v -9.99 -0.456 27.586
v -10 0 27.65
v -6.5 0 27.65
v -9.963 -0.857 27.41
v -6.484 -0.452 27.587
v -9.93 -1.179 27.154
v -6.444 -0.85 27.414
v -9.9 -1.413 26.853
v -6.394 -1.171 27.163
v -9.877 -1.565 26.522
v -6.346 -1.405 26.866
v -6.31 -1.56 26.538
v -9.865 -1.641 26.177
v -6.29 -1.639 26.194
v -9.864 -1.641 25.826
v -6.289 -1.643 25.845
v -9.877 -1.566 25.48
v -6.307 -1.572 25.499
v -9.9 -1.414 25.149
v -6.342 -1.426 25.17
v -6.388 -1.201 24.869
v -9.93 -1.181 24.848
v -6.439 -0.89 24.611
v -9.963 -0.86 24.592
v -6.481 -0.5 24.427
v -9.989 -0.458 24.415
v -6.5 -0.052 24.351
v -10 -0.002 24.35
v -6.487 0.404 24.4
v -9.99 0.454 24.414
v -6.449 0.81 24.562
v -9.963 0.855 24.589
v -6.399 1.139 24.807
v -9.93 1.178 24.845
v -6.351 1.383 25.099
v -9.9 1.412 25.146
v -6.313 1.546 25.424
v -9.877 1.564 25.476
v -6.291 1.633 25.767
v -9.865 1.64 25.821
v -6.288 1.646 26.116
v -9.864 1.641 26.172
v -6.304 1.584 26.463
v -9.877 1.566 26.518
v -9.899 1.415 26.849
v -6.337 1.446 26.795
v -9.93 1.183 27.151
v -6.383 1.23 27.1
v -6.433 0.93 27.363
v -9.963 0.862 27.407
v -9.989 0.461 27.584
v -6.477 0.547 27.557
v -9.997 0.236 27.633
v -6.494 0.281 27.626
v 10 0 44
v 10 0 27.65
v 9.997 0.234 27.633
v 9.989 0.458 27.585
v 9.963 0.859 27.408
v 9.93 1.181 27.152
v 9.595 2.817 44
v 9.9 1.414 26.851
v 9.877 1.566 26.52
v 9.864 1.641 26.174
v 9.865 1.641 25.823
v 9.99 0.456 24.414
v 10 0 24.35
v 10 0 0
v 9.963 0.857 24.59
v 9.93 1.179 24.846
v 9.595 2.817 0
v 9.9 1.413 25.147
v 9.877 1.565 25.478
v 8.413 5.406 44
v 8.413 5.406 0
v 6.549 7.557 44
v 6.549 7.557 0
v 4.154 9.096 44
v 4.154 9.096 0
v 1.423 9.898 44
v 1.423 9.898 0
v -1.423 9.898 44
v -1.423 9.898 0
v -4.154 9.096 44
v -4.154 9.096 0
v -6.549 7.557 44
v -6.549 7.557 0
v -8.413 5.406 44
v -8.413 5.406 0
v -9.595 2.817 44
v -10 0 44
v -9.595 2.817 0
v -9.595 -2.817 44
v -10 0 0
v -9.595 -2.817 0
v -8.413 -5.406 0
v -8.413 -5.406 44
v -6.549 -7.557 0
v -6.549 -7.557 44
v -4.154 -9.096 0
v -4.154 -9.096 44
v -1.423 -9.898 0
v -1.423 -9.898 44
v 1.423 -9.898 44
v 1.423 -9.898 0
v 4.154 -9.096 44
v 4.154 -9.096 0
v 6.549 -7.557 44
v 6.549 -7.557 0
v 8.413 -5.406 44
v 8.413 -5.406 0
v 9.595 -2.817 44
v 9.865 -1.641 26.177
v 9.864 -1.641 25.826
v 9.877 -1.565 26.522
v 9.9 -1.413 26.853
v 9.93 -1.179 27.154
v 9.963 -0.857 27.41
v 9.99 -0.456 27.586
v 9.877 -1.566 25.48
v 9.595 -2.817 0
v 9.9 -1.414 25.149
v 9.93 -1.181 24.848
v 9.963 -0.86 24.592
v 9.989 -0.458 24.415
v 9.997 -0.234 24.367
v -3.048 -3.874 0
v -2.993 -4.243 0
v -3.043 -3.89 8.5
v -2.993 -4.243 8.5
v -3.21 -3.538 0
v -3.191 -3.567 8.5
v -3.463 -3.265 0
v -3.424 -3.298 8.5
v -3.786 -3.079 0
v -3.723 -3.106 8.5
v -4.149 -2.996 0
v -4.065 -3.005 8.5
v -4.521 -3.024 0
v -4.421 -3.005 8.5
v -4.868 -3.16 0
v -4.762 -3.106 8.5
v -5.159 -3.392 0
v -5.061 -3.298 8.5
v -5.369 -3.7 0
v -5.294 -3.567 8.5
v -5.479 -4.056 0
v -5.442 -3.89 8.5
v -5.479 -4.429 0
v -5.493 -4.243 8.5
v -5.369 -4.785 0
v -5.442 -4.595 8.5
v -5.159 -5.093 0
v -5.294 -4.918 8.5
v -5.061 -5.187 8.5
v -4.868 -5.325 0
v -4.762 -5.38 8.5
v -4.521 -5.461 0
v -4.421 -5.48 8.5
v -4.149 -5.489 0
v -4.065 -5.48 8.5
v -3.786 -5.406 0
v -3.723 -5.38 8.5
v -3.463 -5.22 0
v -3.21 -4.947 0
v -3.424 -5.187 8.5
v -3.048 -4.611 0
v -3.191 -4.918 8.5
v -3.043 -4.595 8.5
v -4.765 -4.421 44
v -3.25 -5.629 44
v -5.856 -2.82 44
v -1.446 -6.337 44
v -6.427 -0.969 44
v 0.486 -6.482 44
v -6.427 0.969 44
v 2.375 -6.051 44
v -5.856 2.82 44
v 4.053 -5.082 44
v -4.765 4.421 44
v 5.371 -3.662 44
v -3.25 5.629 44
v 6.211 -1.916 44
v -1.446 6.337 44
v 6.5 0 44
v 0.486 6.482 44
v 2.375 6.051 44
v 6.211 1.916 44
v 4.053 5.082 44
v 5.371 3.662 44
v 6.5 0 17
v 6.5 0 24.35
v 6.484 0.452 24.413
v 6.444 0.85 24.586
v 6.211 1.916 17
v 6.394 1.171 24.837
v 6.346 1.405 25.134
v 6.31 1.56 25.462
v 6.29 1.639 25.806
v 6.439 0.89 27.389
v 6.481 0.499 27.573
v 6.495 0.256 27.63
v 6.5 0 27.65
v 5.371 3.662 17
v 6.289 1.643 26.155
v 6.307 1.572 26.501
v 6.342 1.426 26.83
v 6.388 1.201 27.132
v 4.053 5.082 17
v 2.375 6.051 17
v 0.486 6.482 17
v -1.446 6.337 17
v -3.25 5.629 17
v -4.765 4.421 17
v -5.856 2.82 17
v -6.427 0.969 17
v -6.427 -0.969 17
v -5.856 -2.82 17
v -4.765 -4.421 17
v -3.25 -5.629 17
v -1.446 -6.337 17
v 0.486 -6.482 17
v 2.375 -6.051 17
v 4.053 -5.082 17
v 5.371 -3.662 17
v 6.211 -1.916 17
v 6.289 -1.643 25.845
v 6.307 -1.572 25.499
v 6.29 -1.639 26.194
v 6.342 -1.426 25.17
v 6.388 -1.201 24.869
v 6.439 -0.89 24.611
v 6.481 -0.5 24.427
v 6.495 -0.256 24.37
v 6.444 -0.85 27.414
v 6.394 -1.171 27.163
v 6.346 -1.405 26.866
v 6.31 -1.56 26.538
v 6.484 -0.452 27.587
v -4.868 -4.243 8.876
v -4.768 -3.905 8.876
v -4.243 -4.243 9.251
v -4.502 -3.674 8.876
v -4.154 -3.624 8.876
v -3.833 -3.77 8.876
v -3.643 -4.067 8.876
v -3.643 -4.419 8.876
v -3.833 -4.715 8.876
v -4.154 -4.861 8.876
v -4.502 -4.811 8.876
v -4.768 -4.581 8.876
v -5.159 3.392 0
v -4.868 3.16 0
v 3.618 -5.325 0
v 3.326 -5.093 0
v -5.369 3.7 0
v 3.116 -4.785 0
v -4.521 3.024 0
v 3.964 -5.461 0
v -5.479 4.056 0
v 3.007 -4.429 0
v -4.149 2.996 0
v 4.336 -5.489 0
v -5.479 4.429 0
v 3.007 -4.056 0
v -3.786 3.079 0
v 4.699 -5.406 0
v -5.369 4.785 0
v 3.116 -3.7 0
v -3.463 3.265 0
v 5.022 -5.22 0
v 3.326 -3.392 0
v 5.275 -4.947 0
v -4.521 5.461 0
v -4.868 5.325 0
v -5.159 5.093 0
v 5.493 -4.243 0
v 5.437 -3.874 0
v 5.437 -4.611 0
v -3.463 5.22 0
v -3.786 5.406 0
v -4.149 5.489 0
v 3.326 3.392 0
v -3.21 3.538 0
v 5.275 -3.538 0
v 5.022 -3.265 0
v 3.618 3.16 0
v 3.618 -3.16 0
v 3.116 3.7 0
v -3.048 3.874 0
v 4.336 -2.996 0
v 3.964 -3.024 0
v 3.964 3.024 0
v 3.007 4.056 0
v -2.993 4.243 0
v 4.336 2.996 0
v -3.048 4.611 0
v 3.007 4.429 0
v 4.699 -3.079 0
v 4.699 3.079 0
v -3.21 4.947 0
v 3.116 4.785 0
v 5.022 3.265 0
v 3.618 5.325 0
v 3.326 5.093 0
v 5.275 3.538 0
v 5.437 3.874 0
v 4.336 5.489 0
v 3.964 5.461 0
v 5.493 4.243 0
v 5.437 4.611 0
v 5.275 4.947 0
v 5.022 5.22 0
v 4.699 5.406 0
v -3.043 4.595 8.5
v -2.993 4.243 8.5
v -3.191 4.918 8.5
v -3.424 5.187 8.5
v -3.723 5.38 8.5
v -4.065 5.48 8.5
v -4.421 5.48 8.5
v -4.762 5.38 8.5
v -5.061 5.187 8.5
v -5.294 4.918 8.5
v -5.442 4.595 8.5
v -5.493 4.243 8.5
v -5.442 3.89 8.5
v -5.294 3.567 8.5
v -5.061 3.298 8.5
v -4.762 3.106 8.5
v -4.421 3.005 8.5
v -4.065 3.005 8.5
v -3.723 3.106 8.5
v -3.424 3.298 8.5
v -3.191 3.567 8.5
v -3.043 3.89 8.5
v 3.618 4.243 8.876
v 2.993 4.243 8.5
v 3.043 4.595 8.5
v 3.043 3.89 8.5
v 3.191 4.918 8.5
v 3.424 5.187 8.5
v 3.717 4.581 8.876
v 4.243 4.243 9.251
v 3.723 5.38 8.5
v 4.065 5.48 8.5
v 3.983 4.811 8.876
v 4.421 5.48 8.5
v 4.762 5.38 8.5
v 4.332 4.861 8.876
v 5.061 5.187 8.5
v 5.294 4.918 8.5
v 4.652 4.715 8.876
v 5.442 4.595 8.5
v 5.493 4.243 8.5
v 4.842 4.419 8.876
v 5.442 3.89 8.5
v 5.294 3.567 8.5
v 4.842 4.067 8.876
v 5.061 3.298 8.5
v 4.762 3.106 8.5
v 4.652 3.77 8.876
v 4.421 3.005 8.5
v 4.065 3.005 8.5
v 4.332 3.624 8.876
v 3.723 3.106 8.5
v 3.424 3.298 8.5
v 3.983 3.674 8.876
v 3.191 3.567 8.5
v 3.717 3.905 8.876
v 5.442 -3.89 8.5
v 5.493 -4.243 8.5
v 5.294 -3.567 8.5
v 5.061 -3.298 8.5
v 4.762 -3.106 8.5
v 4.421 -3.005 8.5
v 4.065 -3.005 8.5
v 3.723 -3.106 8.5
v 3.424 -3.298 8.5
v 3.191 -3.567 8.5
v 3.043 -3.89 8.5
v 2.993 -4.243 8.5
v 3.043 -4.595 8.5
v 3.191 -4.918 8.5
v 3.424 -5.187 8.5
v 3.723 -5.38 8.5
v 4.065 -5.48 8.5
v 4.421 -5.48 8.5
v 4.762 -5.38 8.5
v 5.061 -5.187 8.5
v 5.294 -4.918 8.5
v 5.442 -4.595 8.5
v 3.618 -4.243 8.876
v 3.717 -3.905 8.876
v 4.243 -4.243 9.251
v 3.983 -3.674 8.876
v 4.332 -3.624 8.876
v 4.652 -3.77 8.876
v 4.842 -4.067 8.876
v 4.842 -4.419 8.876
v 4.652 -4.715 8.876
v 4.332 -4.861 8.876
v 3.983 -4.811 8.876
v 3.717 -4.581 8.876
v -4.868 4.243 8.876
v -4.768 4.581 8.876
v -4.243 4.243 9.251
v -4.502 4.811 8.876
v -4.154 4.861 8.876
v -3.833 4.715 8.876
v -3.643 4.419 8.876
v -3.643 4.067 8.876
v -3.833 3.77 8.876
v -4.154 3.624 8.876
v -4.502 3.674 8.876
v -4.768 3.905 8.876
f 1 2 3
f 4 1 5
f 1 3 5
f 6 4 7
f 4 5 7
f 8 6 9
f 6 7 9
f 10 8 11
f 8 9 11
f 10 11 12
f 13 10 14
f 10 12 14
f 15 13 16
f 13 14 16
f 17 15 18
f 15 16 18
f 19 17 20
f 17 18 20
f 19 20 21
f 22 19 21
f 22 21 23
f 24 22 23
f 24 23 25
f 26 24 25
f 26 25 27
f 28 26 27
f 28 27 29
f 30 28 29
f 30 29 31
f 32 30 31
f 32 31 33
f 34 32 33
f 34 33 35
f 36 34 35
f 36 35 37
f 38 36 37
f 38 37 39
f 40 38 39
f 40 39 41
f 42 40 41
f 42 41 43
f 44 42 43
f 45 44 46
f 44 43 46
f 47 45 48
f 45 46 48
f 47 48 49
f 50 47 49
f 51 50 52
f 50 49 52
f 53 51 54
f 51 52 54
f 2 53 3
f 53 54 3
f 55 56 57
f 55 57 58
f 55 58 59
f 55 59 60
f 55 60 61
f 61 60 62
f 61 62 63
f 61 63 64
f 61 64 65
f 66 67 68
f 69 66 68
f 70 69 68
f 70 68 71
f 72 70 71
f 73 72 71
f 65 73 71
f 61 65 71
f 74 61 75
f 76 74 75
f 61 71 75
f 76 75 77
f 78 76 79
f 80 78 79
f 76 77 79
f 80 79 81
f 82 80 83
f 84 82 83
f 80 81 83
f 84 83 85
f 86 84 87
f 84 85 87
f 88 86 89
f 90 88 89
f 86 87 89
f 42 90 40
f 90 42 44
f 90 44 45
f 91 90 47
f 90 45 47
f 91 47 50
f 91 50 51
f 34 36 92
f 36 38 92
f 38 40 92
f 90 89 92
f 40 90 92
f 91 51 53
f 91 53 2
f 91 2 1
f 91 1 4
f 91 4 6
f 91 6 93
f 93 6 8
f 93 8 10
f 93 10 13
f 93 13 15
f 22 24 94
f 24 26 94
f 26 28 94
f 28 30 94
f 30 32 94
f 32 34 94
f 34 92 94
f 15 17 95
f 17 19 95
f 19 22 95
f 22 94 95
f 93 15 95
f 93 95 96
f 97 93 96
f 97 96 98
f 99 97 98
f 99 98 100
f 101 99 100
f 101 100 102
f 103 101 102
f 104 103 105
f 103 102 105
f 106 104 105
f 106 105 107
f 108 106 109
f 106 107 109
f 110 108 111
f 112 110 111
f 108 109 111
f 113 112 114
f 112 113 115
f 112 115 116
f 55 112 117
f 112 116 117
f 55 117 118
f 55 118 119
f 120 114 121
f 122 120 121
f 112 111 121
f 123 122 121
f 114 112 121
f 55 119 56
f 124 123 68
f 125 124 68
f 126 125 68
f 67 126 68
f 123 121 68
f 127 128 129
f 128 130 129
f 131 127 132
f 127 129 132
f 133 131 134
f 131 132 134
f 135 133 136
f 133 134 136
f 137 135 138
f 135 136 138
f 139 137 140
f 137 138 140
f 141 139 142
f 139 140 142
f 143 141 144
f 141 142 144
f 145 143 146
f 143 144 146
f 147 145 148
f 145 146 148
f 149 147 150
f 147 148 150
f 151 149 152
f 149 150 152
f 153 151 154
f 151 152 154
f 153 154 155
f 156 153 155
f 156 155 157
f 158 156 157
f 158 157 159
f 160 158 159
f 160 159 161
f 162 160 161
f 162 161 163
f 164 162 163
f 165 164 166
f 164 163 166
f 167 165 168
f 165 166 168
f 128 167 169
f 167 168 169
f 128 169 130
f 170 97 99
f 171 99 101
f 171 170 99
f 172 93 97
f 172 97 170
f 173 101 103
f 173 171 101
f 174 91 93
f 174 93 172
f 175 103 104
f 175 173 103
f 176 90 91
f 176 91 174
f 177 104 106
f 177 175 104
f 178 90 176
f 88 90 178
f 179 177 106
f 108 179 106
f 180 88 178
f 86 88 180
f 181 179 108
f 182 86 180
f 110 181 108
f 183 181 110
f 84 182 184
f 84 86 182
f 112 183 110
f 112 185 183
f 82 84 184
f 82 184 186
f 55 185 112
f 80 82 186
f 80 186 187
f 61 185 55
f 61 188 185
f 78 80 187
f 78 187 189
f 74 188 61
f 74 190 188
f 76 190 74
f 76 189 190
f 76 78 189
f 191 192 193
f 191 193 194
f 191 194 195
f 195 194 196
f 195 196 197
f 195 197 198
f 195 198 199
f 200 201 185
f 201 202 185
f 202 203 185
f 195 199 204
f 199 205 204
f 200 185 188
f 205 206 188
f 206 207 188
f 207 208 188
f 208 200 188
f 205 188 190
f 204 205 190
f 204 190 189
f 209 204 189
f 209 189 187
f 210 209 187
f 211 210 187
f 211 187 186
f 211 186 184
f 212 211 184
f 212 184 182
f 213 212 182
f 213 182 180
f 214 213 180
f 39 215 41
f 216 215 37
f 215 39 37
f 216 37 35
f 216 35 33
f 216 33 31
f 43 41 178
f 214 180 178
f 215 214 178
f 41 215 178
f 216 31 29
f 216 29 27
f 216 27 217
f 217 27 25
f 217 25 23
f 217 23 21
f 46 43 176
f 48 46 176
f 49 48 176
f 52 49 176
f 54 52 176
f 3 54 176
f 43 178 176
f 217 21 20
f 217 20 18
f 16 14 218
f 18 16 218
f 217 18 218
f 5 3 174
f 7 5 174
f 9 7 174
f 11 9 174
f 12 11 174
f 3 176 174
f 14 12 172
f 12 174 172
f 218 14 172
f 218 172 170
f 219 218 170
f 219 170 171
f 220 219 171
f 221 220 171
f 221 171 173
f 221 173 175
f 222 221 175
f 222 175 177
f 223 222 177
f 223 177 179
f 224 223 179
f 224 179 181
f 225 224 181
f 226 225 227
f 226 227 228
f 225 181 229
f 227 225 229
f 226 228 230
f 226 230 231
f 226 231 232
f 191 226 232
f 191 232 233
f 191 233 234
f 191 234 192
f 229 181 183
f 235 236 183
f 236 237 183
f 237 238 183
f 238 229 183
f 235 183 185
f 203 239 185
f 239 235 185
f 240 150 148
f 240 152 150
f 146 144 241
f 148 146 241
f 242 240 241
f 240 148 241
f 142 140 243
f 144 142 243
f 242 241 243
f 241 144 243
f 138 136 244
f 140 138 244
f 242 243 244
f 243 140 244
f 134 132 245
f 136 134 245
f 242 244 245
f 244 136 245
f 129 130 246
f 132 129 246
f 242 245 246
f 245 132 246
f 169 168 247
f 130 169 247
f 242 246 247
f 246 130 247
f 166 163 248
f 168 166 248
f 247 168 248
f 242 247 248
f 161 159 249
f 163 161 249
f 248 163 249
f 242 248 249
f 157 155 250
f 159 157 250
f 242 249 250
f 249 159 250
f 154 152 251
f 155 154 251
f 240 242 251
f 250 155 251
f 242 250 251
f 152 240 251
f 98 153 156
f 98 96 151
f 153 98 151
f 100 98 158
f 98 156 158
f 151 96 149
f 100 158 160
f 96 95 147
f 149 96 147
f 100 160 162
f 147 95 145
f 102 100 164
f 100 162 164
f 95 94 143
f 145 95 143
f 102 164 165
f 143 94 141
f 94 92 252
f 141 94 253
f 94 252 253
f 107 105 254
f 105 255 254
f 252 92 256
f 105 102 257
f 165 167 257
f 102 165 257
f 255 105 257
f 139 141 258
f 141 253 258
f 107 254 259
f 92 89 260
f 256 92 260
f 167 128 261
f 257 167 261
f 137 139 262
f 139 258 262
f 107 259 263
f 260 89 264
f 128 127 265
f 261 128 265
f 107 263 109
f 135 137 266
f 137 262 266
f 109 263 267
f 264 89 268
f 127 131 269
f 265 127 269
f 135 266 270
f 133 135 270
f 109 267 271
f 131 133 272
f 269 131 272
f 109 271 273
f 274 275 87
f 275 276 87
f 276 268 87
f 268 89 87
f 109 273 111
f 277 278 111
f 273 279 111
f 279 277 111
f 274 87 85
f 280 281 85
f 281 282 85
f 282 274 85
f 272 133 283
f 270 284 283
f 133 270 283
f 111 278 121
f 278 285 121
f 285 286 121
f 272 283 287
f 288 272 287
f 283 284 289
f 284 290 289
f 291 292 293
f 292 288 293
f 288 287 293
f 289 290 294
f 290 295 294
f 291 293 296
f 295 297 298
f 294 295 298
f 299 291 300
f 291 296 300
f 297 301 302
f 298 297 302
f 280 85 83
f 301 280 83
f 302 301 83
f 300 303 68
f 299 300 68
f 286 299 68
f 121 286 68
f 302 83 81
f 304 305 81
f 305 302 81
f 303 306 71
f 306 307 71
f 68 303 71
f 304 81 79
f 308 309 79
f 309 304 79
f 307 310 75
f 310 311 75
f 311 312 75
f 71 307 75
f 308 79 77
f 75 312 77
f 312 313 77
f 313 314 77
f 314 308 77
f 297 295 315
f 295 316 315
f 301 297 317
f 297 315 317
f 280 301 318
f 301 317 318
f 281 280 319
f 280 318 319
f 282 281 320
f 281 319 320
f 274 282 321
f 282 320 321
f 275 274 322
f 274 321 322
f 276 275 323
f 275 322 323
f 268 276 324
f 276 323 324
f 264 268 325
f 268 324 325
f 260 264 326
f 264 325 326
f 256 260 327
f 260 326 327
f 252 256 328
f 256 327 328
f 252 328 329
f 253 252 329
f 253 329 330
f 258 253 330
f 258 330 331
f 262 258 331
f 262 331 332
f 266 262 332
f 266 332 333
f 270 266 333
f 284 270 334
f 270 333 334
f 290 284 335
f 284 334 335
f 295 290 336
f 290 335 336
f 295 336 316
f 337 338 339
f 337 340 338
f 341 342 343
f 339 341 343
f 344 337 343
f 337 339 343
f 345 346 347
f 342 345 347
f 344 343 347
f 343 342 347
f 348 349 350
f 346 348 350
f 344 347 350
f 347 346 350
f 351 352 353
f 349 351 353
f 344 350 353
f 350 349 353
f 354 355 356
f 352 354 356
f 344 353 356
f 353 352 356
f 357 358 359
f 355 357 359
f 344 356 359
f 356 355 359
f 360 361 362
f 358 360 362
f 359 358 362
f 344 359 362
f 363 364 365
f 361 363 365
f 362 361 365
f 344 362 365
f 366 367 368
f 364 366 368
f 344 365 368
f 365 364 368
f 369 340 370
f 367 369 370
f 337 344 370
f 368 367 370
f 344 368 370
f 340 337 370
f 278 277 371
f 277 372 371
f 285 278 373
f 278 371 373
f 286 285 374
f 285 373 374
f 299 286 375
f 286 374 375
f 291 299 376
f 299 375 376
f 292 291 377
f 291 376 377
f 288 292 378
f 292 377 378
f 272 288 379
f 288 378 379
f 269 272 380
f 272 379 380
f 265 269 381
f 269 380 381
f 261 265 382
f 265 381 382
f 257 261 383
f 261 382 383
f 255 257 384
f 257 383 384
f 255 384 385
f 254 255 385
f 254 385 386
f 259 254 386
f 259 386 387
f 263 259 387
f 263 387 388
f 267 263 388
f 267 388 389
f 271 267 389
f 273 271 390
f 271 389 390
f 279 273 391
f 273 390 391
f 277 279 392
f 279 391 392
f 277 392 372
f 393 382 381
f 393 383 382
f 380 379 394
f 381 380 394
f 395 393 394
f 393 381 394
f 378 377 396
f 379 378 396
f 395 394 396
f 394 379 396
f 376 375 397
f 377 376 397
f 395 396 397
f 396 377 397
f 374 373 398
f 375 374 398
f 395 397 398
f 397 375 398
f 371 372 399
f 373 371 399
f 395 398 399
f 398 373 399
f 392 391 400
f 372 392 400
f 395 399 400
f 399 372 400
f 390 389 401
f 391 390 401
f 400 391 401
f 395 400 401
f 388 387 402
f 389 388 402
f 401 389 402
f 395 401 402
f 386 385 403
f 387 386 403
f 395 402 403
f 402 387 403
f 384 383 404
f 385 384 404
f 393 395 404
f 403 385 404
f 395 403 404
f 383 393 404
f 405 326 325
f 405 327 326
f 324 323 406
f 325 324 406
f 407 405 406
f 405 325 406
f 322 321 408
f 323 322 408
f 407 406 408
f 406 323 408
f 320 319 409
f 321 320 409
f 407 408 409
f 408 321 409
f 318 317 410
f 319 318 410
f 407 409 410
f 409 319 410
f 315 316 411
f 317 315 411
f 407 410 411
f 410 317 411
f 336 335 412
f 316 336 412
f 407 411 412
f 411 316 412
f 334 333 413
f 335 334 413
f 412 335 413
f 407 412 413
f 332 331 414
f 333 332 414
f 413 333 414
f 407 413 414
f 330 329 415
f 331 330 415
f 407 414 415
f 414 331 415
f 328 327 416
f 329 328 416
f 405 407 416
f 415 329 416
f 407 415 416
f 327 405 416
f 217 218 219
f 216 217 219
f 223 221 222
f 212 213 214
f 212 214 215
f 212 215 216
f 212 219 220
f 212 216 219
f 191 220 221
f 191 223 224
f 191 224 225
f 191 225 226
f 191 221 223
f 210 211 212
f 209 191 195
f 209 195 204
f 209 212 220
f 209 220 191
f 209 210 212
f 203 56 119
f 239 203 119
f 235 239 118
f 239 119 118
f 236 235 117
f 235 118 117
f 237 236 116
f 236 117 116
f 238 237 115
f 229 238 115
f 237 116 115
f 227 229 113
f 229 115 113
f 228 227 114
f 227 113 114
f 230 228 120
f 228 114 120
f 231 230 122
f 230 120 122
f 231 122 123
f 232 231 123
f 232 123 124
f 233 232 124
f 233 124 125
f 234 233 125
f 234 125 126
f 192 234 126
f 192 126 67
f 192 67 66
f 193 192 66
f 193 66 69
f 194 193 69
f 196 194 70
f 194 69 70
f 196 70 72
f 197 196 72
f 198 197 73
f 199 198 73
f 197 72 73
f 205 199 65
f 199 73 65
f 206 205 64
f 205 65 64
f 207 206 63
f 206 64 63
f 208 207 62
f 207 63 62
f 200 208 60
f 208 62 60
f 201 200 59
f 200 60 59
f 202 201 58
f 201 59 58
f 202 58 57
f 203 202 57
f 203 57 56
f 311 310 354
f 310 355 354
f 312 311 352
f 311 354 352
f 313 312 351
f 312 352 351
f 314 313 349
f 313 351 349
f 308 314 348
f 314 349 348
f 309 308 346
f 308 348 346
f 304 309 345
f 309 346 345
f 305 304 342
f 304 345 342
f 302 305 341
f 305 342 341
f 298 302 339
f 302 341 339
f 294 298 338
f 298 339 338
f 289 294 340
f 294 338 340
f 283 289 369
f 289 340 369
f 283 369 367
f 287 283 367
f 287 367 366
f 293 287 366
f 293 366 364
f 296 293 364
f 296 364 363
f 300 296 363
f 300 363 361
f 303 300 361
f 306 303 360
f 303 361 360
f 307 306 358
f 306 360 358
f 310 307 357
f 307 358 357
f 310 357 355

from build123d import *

# Parameters (mm, degrees)
SKETCH_1_R          = 10
EXTRUDE_1_DEPTH     = 44
SKETCH_2_R          = 6.5
CUT_EXTRUDE_1_DEPTH = 27
M4X0_71_D           = 3.3
M3X0_51_D           = 2.5
M3X0_51_DEPTH       = 8.5
M3X0_51_TIP         = 0.751075774


with BuildPart() as part:
    # Эскиз1 → Бобышка-Вытянуть1 (new body)
    with BuildSketch(Plane.XY):
        Circle(SKETCH_1_R)
    extrude(amount=EXTRUDE_1_DEPTH)

    # Эскиз2 → Вырез-Вытянуть1 (cut)
    with BuildSketch(Plane.XY.offset(44)):
        Circle(SKETCH_2_R)
    extrude(amount=-CUT_EXTRUDE_1_DEPTH, mode=Mode.SUBTRACT)

    # Отверстие обработанное метчиком M4x0.71 (through all)
    with Locations(Plane(origin=(-10, 0, 0), x_dir=(0, 0, -1), z_dir=(-1, 0, 0))):
        with Locations((-26, 0)):
            Hole(M4X0_71_D / 2)

    # Отверстие обработанное метчиком M3x0.51
    with Locations(Plane(origin=(0, 0, 0), x_dir=(-1, 0, 0), z_dir=(0, 0, -1))):
        with Locations((-4.242640687, 4.242640687), (4.242640687, 4.242640687), (4.242640687, -4.242640687), (-4.242640687, -4.242640687)):
            Hole(M3X0_51_D / 2, depth=M3X0_51_DEPTH)
            with Locations((0, 0, -(M3X0_51_DEPTH + M3X0_51_TIP / 2))):  # 118° drill point
                Cone(0, M3X0_51_D / 2, M3X0_51_TIP, mode=Mode.SUBTRACT)


solid = part.part
